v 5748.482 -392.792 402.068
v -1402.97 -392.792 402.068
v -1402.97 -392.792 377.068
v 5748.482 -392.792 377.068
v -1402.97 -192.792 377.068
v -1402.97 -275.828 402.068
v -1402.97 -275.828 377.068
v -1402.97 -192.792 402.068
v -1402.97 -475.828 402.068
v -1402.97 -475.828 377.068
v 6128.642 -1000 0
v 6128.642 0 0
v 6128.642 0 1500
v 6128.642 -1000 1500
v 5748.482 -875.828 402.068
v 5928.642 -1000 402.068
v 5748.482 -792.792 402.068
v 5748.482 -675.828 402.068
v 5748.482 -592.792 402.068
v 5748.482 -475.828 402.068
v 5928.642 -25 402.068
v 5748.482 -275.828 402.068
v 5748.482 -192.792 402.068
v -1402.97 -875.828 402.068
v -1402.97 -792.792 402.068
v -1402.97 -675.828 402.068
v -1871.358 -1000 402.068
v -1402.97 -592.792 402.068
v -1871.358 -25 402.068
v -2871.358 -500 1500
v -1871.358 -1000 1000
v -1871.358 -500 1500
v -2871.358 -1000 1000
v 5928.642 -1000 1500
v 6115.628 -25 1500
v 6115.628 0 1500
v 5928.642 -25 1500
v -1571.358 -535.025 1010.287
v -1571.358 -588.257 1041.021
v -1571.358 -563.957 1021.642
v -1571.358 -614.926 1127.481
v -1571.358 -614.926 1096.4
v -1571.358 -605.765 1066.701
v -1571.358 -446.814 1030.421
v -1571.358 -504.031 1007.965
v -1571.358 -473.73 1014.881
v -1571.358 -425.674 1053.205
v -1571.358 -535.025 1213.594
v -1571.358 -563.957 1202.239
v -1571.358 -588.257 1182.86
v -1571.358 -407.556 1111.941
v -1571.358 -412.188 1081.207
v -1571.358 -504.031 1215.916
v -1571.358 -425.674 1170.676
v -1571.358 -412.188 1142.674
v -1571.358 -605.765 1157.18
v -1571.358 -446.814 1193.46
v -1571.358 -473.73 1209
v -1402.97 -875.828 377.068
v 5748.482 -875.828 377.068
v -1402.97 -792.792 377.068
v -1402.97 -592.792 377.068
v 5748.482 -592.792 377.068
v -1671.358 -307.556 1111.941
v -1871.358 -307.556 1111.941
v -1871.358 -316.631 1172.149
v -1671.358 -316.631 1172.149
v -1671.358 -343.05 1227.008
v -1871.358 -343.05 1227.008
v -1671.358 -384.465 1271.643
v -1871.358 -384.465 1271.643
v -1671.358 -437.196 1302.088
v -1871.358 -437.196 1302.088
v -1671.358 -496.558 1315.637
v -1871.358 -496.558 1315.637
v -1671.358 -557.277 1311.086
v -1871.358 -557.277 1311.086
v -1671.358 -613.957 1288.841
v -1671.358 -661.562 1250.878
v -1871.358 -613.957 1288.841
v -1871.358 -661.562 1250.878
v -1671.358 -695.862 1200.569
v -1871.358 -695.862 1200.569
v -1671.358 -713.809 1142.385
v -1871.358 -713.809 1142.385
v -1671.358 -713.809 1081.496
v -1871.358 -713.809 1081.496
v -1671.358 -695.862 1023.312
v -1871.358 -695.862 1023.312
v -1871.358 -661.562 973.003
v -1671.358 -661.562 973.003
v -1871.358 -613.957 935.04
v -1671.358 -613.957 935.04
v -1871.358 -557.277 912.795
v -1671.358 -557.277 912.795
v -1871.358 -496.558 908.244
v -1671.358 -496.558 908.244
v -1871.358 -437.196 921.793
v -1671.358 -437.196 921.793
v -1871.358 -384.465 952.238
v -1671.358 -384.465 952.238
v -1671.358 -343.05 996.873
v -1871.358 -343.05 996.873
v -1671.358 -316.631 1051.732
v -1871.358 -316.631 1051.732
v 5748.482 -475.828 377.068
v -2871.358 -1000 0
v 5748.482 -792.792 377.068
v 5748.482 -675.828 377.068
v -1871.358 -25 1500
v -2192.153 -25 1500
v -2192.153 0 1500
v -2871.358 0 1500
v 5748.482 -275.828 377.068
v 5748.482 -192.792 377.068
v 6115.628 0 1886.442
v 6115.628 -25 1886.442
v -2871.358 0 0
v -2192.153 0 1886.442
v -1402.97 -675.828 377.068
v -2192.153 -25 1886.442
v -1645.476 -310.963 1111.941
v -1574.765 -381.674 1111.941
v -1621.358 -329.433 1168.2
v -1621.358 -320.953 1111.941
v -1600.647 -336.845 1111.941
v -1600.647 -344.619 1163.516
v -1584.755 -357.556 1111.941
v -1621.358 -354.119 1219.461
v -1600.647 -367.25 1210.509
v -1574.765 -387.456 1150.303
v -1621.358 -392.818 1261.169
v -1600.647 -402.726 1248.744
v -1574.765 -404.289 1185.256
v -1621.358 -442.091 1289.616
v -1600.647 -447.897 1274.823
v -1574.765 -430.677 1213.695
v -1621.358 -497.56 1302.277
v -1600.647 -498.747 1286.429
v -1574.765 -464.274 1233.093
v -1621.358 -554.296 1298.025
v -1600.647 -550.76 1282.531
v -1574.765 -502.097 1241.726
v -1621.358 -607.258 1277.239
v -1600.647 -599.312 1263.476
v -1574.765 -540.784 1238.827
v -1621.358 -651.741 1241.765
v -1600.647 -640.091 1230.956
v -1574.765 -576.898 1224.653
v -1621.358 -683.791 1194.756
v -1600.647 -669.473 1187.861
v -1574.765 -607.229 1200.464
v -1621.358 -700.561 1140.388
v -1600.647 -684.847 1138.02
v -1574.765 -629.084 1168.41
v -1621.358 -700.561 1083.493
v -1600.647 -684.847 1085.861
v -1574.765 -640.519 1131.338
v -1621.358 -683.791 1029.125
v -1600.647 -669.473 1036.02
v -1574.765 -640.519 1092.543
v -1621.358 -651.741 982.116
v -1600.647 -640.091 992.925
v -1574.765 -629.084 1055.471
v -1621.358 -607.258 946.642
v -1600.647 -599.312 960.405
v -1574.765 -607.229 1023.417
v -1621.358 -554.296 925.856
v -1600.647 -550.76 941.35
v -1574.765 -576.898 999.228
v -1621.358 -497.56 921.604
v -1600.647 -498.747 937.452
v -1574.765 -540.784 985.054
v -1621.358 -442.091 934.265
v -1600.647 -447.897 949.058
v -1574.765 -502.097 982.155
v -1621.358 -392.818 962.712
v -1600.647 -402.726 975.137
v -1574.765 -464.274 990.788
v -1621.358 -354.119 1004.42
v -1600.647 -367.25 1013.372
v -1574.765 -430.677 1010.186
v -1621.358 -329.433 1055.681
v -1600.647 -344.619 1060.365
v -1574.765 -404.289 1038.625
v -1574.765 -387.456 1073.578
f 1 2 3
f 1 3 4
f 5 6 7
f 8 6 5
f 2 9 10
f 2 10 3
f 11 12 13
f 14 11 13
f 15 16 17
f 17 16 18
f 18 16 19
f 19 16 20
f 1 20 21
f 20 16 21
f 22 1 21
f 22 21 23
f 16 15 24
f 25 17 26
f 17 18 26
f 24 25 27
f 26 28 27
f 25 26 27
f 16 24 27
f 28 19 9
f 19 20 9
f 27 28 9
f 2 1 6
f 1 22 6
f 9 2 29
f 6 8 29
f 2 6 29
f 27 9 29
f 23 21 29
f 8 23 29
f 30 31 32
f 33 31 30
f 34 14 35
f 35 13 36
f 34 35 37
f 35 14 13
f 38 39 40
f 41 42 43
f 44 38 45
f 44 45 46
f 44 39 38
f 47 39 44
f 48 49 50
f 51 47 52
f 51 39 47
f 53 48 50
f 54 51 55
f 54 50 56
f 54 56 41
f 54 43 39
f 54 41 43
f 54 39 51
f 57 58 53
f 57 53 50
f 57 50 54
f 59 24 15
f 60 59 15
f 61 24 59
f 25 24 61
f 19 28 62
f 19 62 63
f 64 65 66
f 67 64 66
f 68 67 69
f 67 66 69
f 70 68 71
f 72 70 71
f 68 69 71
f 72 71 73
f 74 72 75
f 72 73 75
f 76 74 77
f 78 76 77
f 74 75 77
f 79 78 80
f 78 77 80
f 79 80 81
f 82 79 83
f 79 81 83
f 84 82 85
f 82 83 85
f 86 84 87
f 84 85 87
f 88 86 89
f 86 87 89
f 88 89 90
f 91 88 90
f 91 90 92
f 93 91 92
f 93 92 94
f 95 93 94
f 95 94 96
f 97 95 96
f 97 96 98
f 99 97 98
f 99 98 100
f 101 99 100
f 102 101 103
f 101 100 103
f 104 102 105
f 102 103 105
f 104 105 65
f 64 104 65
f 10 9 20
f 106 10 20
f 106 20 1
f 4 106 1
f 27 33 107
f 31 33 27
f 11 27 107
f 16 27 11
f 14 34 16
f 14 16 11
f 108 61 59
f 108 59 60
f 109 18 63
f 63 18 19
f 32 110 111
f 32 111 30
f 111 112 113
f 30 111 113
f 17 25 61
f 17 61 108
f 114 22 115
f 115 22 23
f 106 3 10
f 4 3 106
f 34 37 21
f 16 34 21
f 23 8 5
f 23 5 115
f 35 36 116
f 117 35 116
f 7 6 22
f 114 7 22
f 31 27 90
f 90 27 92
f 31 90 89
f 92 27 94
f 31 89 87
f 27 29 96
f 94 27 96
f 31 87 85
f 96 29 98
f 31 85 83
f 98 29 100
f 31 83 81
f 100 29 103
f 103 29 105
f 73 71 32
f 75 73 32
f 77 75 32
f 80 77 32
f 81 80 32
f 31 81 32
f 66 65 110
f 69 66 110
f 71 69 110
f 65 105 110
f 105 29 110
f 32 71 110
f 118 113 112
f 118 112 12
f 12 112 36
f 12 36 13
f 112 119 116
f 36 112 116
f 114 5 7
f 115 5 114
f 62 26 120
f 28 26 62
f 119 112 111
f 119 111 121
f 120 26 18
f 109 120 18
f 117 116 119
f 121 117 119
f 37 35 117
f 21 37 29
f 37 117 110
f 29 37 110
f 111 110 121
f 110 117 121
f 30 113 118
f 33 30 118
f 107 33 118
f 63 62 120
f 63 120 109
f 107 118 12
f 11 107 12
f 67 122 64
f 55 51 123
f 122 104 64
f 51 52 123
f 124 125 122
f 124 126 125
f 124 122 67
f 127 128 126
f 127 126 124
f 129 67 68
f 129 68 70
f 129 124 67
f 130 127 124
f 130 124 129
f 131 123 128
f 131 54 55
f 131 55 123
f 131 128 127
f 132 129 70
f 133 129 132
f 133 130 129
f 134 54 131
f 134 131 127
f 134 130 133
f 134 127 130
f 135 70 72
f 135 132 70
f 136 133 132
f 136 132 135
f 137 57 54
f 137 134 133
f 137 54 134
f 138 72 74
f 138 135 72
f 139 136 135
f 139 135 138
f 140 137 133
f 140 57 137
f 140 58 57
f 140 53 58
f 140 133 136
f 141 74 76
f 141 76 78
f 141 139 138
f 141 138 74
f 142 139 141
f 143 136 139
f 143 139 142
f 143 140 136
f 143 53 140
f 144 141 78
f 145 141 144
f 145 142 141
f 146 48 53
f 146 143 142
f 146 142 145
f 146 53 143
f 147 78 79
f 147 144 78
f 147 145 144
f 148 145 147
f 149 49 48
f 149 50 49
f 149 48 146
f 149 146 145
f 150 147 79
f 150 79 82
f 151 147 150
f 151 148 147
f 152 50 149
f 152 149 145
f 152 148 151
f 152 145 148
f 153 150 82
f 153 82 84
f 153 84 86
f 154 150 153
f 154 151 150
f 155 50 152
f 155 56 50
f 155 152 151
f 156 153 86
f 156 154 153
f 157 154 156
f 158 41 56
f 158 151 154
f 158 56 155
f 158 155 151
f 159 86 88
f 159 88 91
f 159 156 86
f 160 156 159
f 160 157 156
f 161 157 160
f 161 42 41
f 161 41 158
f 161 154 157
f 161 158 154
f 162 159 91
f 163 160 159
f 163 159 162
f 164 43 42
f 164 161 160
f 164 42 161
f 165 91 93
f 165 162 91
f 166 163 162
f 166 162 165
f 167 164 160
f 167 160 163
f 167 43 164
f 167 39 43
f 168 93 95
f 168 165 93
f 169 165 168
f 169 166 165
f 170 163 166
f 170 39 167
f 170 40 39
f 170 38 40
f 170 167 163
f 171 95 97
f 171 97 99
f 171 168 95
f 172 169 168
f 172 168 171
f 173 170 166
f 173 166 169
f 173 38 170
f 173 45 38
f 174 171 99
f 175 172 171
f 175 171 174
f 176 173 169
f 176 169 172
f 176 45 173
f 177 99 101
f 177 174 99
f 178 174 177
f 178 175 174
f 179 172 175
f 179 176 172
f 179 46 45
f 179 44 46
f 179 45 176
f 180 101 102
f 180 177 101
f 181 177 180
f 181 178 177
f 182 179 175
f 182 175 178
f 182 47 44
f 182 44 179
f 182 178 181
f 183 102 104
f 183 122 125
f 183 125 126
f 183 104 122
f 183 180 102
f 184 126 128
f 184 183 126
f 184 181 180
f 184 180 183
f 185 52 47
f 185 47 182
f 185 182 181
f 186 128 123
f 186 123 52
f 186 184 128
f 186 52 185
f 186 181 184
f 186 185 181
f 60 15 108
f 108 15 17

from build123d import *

# Parameters (mm, degrees)
F1_DEPTH = 1000
F2_W     = 8307.780505
F2_H     = 1645.880968
F3_DEPTH = 25
F4_R     = 204.2673
F5_DEPTH = 300
F6_SIZE  = 500
F7_R     = 100
F8_W     = 7151.451826
F8_H     = 83.035737
F9_DEPTH = 25


with BuildPart() as f1:
    # F0 (on Front) → F1 (new body)
    with BuildSketch(Plane.XZ):
        Polygon((-1871.357652, 1500), (-2871.357652, 1500), (-2871.357652, 0), (6128.642348, 0), (6128.642348, 1500), (5928.642348, 1500), (5928.642348, 402.068209), (-1871.357652, 402.068209), align=None)
    extrude(amount=F1_DEPTH)

    # F2 (on face) → F3 (join)
    with BuildSketch(Plane(origin=(0, 0, 0), x_dir=(-1, 0, 0), z_dir=(0, 1, 0))):
        with Locations((-1961.737513, 1063.501224)):
            Rectangle(F2_W, F2_H)
    extrude(amount=-F3_DEPTH)

    # F4 (on face) → F5 (join)
    with BuildSketch(Plane.YZ.offset(-1871.357652)):
        with Locations((-511.823237, 1111.940503)):
            Circle(F4_R)
    extrude(amount=F5_DEPTH)

    # F6
    f6_edges = [f1.edges().sort_by_distance(p)[0] for p in [
        (-2371.357652, -1000, 1500),
    ]]
    chamfer(f6_edges, length=F6_SIZE)

    # F7
    f7_edges = [f1.edges().sort_by_distance(p)[0] for p in [
        (-1571.357652, -716.090537, 1111.940503),
    ]]
    fillet(f7_edges, radius=F7_R)

    # F8 (on face) → F9 (cut)
    with BuildSketch(Plane.XY.offset(402.068209)):
        with Locations((2172.755837, -234.309956)):
            Rectangle(F8_W, F8_H)
        with Locations((2172.755837, -434.309956)):
            Rectangle(F8_W, F8_H)
        with Locations((2172.755837, -634.309956)):
            Rectangle(F8_W, F8_H)
        with Locations((2172.755837, -834.309956)):
            Rectangle(F8_W, F8_H)
    extrude(amount=-F9_DEPTH, mode=Mode.SUBTRACT)


solid = f1.part
